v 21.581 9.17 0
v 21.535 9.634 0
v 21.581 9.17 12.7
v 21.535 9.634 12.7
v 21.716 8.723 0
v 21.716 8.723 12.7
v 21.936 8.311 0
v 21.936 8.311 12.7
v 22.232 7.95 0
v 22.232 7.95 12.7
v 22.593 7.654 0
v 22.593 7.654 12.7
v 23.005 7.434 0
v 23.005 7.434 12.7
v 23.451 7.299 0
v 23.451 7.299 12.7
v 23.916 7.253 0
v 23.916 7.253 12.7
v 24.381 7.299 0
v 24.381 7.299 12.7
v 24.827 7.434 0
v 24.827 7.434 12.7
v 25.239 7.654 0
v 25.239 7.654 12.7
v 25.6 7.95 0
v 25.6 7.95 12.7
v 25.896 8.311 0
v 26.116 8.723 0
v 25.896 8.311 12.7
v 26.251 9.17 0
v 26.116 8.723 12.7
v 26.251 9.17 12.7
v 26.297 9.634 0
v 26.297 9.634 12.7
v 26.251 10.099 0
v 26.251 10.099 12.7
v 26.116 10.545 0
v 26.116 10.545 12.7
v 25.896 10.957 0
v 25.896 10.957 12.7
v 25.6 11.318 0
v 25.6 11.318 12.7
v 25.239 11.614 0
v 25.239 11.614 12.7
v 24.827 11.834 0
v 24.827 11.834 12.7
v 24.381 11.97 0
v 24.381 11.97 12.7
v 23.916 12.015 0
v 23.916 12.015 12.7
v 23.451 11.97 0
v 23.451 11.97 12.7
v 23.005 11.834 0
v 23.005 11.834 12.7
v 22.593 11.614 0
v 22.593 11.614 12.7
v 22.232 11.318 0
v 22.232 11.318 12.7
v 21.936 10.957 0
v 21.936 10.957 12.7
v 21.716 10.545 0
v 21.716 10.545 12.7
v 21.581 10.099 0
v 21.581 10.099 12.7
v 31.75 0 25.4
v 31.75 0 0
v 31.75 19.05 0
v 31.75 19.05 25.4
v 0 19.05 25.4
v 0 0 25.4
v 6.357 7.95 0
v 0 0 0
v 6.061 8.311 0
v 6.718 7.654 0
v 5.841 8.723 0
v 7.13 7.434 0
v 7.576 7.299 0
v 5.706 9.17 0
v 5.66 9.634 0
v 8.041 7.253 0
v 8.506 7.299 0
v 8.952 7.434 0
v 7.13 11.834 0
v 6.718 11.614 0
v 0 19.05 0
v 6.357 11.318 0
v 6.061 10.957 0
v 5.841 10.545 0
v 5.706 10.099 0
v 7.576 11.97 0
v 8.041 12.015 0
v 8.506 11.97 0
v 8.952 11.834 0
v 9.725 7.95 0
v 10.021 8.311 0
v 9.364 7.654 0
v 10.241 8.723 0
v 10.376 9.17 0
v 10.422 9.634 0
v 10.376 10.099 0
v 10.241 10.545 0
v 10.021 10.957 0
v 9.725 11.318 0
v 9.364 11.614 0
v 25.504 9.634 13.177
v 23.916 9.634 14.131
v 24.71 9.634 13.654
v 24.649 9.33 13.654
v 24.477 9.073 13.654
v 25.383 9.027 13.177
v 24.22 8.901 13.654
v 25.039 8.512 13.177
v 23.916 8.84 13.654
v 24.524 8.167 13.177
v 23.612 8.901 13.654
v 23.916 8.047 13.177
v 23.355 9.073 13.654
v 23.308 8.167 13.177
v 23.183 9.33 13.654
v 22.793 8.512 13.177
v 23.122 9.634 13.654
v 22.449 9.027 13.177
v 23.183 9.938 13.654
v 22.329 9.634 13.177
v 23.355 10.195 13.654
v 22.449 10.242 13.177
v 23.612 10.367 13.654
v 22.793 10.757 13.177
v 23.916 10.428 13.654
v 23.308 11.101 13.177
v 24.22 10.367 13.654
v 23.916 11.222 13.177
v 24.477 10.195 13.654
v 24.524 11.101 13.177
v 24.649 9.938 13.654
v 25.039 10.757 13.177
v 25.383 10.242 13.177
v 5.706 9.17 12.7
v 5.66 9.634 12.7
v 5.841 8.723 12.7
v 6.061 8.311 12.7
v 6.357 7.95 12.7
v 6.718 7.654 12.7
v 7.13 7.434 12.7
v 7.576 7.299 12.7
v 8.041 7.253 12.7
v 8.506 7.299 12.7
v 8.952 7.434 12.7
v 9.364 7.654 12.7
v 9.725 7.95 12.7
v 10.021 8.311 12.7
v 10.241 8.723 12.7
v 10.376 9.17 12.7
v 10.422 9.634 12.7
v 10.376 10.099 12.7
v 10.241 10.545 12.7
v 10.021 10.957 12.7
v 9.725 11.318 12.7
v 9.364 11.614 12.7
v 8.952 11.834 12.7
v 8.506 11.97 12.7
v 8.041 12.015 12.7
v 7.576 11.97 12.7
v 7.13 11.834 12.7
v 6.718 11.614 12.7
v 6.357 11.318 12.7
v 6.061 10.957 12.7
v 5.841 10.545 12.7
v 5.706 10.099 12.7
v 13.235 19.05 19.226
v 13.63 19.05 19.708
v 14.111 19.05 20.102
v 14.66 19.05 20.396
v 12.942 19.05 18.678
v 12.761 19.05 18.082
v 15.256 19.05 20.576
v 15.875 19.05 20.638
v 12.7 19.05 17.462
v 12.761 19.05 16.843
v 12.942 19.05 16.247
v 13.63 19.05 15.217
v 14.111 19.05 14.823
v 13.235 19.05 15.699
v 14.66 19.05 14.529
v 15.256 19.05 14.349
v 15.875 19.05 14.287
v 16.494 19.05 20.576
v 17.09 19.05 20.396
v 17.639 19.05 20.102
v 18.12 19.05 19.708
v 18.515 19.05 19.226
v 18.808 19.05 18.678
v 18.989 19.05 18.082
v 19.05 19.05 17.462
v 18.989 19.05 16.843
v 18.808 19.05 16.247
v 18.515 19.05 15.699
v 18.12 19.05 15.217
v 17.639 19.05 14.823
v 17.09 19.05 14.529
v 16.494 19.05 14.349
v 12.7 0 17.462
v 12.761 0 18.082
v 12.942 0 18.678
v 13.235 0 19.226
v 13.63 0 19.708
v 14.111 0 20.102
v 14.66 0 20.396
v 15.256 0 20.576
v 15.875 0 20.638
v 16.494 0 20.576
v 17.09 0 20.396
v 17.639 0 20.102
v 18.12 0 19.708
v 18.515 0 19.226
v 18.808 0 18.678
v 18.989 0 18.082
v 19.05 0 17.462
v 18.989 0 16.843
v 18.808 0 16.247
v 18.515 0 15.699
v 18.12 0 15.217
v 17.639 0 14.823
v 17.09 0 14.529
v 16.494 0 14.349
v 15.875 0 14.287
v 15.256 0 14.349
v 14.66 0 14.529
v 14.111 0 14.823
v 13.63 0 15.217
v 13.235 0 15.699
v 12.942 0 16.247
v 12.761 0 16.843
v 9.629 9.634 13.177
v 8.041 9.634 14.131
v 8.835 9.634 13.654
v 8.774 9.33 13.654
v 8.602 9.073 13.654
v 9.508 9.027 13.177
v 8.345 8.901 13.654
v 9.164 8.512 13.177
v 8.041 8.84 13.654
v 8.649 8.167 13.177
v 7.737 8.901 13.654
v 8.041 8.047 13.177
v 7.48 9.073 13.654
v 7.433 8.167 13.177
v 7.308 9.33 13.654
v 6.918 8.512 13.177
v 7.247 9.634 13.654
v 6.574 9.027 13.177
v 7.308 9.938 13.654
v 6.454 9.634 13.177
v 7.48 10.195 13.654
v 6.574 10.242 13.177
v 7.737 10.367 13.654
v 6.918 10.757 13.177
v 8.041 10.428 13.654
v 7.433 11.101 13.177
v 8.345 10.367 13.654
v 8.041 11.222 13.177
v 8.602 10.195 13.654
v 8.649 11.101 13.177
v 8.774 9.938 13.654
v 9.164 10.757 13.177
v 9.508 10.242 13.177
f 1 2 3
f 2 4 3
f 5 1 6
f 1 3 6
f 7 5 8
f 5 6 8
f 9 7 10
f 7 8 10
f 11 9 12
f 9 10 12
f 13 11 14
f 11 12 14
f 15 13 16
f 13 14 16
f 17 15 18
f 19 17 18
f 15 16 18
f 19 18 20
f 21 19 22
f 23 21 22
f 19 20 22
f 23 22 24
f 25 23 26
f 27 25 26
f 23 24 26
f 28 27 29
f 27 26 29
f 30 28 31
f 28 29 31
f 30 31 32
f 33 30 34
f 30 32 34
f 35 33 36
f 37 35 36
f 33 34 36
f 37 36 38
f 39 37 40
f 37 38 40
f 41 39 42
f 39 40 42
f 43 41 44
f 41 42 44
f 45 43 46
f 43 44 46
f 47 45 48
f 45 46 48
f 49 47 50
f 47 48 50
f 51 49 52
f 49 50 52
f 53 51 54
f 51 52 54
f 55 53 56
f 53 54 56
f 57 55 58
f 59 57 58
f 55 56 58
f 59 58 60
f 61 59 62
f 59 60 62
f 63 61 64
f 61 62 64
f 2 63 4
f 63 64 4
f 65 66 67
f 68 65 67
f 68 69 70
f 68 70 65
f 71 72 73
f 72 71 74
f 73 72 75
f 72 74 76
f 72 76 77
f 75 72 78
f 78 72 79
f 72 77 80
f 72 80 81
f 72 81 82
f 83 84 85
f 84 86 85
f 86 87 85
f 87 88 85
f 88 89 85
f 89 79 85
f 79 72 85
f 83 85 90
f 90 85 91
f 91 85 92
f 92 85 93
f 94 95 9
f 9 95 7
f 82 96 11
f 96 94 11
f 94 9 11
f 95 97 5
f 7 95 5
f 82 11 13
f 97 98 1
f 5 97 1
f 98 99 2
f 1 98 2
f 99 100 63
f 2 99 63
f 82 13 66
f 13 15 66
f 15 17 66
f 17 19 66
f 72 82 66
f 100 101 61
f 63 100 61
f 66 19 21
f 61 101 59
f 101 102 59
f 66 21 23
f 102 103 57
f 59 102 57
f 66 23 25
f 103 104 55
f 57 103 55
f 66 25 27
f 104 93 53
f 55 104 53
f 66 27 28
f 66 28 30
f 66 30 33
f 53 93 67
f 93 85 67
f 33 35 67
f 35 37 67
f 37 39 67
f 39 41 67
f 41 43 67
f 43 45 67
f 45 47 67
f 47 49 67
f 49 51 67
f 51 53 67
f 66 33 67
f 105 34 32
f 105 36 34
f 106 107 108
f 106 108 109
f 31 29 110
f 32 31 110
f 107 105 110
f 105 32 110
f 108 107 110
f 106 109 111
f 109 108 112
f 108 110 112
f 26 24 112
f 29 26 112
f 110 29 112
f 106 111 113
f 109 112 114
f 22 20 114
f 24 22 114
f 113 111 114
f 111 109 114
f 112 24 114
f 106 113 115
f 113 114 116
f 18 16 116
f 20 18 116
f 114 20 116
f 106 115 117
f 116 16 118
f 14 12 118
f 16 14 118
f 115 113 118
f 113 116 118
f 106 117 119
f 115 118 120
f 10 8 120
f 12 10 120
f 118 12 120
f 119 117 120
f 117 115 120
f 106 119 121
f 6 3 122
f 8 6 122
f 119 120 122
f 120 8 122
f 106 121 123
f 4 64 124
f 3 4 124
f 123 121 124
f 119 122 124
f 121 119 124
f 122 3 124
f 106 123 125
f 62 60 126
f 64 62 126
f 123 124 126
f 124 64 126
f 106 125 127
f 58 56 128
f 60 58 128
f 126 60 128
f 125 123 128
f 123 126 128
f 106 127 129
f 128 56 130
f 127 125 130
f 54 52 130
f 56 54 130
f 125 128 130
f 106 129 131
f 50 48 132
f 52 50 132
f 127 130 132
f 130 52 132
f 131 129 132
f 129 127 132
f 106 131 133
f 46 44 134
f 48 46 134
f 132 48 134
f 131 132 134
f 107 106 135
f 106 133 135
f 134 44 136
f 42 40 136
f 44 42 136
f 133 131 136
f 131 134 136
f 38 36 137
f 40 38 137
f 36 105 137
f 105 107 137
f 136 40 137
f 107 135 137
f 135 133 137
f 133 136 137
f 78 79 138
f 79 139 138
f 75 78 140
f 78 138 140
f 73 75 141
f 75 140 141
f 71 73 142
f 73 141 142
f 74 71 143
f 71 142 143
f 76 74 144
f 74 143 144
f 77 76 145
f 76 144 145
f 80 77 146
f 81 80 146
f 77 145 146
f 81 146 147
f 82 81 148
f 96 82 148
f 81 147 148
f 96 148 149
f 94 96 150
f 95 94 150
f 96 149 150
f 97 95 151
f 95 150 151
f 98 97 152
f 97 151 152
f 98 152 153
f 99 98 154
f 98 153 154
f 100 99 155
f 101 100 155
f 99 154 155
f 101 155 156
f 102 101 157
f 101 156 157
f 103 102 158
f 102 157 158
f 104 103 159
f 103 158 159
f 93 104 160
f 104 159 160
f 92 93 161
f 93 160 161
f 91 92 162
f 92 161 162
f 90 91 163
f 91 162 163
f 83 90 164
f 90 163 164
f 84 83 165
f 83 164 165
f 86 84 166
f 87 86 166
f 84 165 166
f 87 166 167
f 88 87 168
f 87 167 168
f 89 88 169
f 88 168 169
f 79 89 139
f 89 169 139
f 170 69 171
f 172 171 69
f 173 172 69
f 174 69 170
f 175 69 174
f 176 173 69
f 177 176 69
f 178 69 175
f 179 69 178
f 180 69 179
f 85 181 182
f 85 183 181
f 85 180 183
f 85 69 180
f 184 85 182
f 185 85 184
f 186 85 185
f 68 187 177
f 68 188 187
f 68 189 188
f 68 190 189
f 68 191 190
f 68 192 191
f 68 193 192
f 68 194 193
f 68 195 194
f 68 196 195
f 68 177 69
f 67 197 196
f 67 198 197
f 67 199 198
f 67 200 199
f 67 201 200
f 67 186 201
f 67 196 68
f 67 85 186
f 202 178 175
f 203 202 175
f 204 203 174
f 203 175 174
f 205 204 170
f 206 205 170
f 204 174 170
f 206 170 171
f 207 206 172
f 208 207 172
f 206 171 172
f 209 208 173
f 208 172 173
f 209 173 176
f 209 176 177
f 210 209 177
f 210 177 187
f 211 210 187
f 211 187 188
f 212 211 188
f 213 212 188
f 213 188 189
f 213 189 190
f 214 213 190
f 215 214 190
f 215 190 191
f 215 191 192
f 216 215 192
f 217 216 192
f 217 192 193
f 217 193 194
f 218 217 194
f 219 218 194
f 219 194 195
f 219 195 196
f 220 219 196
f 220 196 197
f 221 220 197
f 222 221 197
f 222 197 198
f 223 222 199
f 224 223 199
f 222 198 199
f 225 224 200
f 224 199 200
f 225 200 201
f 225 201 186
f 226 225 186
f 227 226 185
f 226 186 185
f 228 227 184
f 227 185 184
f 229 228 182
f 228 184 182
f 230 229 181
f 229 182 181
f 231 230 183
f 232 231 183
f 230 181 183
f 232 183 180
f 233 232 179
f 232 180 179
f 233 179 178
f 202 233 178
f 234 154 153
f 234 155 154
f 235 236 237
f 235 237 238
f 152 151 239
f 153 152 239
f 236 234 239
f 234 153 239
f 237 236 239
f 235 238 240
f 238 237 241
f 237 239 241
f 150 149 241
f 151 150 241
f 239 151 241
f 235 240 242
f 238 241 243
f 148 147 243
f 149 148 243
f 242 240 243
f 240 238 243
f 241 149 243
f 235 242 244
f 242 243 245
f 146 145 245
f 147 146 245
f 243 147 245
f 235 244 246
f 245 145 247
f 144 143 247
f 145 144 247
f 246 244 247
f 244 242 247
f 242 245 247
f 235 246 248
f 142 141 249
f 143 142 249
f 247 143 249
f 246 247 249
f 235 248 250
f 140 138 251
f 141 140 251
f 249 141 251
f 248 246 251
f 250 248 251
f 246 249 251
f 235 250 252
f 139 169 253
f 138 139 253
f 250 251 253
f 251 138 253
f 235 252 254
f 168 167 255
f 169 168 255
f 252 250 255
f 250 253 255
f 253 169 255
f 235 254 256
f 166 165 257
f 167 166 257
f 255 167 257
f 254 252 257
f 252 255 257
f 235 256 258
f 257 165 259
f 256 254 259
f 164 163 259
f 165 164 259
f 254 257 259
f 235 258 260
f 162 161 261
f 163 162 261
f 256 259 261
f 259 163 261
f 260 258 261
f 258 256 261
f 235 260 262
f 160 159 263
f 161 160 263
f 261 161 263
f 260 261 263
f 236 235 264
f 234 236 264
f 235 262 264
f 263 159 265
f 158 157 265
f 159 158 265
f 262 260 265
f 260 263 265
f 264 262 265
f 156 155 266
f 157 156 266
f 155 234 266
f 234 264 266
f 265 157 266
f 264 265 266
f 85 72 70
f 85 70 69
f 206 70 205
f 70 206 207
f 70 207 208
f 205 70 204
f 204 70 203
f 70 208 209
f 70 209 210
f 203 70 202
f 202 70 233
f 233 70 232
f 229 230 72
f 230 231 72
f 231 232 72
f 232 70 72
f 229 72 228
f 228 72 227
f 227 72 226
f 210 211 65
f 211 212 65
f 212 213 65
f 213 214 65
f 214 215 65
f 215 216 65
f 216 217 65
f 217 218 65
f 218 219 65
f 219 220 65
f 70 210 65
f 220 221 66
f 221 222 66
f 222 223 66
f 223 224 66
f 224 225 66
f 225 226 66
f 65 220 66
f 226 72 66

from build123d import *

# Parameters (mm, degrees)
F0_W     = 31.75
F0_H     = 19.05
F1_DEPTH = 25.4
F3_D     = 4.7625
F3_DEPTH = 12.7
F3_TIP   = 1.4307993491
F5_D     = 6.35


with BuildPart() as f1:
    # F0 (on Top) → F1 (new body)
    with BuildSketch(Plane.XY):
        with Locations((15.875, 9.525)):
            Rectangle(F0_W, F0_H)
    extrude(amount=F1_DEPTH)

    # F3
    with Locations(Plane(origin=(0, 0, 0), x_dir=(1, 0, 0), z_dir=(0, 0, -1))):
        with Locations((8.041003041, -9.6340968012), (23.916003041, -9.6340968012)):
            Hole(F3_D / 2, depth=F3_DEPTH)
            with Locations((0, 0, -(F3_DEPTH + F3_TIP / 2))):  # 118° drill point
                Cone(0, F3_D / 2, F3_TIP, mode=Mode.SUBTRACT)

    # F5 (through all)
    with Locations(Plane.XZ):
        with Locations((15.875, 17.4625)):
            Hole(F5_D / 2)


solid = f1.part
